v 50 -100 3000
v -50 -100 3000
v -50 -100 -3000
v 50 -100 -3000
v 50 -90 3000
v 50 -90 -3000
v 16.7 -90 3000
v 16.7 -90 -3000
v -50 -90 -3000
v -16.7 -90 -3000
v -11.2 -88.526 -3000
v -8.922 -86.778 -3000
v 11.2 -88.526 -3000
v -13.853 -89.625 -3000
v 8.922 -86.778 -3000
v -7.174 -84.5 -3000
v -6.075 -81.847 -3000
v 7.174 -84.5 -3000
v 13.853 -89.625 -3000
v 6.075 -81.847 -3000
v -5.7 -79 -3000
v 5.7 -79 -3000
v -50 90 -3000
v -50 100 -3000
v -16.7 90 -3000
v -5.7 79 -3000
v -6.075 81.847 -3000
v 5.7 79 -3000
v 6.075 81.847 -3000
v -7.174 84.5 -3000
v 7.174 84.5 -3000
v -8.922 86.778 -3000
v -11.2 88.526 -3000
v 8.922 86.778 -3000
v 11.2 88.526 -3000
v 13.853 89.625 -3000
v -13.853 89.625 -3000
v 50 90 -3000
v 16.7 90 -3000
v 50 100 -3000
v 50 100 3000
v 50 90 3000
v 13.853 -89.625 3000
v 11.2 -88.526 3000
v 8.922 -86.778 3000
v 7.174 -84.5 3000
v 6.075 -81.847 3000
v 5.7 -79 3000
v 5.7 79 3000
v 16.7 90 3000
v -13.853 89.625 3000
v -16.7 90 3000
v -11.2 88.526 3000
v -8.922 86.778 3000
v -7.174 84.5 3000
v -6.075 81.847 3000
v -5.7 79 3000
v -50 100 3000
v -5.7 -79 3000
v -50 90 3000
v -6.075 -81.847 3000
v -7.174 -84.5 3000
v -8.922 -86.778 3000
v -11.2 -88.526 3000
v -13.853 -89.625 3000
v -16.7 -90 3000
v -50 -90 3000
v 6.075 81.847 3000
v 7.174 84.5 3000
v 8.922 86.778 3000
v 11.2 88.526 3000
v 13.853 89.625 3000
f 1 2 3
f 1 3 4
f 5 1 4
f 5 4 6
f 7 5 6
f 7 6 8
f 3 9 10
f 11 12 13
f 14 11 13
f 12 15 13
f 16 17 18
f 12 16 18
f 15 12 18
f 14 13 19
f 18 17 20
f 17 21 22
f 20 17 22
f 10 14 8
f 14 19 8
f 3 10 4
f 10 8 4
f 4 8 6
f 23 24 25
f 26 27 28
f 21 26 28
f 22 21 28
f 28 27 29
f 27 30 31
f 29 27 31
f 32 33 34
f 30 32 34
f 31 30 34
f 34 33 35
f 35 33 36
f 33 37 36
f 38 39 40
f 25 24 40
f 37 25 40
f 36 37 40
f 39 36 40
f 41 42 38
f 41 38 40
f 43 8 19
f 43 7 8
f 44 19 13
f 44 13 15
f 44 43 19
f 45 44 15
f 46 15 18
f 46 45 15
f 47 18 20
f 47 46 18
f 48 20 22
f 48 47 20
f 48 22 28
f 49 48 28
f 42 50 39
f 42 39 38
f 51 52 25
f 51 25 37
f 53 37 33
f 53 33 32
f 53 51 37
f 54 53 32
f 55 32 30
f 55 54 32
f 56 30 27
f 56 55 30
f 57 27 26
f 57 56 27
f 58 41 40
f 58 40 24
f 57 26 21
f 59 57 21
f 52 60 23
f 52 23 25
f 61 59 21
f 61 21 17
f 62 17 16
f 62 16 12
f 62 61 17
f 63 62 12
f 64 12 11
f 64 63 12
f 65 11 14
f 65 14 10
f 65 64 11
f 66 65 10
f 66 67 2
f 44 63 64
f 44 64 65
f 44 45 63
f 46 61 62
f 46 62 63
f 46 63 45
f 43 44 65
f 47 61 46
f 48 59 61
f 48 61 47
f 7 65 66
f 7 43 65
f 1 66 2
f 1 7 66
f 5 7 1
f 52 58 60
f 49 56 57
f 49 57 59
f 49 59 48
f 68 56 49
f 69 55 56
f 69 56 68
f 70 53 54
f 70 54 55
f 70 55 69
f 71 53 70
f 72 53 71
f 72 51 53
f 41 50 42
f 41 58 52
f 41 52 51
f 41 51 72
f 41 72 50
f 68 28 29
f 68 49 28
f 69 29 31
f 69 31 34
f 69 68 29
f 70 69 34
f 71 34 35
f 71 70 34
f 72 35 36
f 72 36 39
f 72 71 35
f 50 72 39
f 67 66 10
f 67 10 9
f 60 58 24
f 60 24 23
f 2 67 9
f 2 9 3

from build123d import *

# Parameters (mm, degrees)
BOSS_EXTRUDE1_DEPTH = 3000


with BuildPart() as part:
    # Sketch1 → Boss-Extrude1 (new, symmetric)
    with BuildSketch(Plane.XY):
        with BuildLine():
            Line((5.7, 0), (5.7, 79))
            ThreePointArc((5.7, 79), (8.921825407, 86.778174593), (16.7, 90))
            Line((16.7, 90), (50, 90))
            Line((50, 90), (50, 100))
            Line((50, 100), (-50, 100))
            Line((-50, 100), (-50, 90))
            Line((-50, 90), (-16.7, 90))
            ThreePointArc((-16.7, 90), (-8.921825407, 86.778174593), (-5.7, 79))
            Line((-5.7, 79), (-5.7, 0))
            Line((-5.7, 0), (-5.7, -79))
            ThreePointArc((-5.7, -79), (-8.921825407, -86.778174593), (-16.7, -90))
            Line((-16.7, -90), (-50, -90))
            Line((-50, -90), (-50, -100))
            Line((-50, -100), (50, -100))
            Line((50, -100), (50, -90))
            Line((50, -90), (16.7, -90))
            ThreePointArc((16.7, -90), (8.921825407, -86.778174593), (5.7, -79))
            Line((5.7, -79), (5.7, 0))
        make_face()
    extrude(amount=BOSS_EXTRUDE1_DEPTH, both=True)


solid = part.part
